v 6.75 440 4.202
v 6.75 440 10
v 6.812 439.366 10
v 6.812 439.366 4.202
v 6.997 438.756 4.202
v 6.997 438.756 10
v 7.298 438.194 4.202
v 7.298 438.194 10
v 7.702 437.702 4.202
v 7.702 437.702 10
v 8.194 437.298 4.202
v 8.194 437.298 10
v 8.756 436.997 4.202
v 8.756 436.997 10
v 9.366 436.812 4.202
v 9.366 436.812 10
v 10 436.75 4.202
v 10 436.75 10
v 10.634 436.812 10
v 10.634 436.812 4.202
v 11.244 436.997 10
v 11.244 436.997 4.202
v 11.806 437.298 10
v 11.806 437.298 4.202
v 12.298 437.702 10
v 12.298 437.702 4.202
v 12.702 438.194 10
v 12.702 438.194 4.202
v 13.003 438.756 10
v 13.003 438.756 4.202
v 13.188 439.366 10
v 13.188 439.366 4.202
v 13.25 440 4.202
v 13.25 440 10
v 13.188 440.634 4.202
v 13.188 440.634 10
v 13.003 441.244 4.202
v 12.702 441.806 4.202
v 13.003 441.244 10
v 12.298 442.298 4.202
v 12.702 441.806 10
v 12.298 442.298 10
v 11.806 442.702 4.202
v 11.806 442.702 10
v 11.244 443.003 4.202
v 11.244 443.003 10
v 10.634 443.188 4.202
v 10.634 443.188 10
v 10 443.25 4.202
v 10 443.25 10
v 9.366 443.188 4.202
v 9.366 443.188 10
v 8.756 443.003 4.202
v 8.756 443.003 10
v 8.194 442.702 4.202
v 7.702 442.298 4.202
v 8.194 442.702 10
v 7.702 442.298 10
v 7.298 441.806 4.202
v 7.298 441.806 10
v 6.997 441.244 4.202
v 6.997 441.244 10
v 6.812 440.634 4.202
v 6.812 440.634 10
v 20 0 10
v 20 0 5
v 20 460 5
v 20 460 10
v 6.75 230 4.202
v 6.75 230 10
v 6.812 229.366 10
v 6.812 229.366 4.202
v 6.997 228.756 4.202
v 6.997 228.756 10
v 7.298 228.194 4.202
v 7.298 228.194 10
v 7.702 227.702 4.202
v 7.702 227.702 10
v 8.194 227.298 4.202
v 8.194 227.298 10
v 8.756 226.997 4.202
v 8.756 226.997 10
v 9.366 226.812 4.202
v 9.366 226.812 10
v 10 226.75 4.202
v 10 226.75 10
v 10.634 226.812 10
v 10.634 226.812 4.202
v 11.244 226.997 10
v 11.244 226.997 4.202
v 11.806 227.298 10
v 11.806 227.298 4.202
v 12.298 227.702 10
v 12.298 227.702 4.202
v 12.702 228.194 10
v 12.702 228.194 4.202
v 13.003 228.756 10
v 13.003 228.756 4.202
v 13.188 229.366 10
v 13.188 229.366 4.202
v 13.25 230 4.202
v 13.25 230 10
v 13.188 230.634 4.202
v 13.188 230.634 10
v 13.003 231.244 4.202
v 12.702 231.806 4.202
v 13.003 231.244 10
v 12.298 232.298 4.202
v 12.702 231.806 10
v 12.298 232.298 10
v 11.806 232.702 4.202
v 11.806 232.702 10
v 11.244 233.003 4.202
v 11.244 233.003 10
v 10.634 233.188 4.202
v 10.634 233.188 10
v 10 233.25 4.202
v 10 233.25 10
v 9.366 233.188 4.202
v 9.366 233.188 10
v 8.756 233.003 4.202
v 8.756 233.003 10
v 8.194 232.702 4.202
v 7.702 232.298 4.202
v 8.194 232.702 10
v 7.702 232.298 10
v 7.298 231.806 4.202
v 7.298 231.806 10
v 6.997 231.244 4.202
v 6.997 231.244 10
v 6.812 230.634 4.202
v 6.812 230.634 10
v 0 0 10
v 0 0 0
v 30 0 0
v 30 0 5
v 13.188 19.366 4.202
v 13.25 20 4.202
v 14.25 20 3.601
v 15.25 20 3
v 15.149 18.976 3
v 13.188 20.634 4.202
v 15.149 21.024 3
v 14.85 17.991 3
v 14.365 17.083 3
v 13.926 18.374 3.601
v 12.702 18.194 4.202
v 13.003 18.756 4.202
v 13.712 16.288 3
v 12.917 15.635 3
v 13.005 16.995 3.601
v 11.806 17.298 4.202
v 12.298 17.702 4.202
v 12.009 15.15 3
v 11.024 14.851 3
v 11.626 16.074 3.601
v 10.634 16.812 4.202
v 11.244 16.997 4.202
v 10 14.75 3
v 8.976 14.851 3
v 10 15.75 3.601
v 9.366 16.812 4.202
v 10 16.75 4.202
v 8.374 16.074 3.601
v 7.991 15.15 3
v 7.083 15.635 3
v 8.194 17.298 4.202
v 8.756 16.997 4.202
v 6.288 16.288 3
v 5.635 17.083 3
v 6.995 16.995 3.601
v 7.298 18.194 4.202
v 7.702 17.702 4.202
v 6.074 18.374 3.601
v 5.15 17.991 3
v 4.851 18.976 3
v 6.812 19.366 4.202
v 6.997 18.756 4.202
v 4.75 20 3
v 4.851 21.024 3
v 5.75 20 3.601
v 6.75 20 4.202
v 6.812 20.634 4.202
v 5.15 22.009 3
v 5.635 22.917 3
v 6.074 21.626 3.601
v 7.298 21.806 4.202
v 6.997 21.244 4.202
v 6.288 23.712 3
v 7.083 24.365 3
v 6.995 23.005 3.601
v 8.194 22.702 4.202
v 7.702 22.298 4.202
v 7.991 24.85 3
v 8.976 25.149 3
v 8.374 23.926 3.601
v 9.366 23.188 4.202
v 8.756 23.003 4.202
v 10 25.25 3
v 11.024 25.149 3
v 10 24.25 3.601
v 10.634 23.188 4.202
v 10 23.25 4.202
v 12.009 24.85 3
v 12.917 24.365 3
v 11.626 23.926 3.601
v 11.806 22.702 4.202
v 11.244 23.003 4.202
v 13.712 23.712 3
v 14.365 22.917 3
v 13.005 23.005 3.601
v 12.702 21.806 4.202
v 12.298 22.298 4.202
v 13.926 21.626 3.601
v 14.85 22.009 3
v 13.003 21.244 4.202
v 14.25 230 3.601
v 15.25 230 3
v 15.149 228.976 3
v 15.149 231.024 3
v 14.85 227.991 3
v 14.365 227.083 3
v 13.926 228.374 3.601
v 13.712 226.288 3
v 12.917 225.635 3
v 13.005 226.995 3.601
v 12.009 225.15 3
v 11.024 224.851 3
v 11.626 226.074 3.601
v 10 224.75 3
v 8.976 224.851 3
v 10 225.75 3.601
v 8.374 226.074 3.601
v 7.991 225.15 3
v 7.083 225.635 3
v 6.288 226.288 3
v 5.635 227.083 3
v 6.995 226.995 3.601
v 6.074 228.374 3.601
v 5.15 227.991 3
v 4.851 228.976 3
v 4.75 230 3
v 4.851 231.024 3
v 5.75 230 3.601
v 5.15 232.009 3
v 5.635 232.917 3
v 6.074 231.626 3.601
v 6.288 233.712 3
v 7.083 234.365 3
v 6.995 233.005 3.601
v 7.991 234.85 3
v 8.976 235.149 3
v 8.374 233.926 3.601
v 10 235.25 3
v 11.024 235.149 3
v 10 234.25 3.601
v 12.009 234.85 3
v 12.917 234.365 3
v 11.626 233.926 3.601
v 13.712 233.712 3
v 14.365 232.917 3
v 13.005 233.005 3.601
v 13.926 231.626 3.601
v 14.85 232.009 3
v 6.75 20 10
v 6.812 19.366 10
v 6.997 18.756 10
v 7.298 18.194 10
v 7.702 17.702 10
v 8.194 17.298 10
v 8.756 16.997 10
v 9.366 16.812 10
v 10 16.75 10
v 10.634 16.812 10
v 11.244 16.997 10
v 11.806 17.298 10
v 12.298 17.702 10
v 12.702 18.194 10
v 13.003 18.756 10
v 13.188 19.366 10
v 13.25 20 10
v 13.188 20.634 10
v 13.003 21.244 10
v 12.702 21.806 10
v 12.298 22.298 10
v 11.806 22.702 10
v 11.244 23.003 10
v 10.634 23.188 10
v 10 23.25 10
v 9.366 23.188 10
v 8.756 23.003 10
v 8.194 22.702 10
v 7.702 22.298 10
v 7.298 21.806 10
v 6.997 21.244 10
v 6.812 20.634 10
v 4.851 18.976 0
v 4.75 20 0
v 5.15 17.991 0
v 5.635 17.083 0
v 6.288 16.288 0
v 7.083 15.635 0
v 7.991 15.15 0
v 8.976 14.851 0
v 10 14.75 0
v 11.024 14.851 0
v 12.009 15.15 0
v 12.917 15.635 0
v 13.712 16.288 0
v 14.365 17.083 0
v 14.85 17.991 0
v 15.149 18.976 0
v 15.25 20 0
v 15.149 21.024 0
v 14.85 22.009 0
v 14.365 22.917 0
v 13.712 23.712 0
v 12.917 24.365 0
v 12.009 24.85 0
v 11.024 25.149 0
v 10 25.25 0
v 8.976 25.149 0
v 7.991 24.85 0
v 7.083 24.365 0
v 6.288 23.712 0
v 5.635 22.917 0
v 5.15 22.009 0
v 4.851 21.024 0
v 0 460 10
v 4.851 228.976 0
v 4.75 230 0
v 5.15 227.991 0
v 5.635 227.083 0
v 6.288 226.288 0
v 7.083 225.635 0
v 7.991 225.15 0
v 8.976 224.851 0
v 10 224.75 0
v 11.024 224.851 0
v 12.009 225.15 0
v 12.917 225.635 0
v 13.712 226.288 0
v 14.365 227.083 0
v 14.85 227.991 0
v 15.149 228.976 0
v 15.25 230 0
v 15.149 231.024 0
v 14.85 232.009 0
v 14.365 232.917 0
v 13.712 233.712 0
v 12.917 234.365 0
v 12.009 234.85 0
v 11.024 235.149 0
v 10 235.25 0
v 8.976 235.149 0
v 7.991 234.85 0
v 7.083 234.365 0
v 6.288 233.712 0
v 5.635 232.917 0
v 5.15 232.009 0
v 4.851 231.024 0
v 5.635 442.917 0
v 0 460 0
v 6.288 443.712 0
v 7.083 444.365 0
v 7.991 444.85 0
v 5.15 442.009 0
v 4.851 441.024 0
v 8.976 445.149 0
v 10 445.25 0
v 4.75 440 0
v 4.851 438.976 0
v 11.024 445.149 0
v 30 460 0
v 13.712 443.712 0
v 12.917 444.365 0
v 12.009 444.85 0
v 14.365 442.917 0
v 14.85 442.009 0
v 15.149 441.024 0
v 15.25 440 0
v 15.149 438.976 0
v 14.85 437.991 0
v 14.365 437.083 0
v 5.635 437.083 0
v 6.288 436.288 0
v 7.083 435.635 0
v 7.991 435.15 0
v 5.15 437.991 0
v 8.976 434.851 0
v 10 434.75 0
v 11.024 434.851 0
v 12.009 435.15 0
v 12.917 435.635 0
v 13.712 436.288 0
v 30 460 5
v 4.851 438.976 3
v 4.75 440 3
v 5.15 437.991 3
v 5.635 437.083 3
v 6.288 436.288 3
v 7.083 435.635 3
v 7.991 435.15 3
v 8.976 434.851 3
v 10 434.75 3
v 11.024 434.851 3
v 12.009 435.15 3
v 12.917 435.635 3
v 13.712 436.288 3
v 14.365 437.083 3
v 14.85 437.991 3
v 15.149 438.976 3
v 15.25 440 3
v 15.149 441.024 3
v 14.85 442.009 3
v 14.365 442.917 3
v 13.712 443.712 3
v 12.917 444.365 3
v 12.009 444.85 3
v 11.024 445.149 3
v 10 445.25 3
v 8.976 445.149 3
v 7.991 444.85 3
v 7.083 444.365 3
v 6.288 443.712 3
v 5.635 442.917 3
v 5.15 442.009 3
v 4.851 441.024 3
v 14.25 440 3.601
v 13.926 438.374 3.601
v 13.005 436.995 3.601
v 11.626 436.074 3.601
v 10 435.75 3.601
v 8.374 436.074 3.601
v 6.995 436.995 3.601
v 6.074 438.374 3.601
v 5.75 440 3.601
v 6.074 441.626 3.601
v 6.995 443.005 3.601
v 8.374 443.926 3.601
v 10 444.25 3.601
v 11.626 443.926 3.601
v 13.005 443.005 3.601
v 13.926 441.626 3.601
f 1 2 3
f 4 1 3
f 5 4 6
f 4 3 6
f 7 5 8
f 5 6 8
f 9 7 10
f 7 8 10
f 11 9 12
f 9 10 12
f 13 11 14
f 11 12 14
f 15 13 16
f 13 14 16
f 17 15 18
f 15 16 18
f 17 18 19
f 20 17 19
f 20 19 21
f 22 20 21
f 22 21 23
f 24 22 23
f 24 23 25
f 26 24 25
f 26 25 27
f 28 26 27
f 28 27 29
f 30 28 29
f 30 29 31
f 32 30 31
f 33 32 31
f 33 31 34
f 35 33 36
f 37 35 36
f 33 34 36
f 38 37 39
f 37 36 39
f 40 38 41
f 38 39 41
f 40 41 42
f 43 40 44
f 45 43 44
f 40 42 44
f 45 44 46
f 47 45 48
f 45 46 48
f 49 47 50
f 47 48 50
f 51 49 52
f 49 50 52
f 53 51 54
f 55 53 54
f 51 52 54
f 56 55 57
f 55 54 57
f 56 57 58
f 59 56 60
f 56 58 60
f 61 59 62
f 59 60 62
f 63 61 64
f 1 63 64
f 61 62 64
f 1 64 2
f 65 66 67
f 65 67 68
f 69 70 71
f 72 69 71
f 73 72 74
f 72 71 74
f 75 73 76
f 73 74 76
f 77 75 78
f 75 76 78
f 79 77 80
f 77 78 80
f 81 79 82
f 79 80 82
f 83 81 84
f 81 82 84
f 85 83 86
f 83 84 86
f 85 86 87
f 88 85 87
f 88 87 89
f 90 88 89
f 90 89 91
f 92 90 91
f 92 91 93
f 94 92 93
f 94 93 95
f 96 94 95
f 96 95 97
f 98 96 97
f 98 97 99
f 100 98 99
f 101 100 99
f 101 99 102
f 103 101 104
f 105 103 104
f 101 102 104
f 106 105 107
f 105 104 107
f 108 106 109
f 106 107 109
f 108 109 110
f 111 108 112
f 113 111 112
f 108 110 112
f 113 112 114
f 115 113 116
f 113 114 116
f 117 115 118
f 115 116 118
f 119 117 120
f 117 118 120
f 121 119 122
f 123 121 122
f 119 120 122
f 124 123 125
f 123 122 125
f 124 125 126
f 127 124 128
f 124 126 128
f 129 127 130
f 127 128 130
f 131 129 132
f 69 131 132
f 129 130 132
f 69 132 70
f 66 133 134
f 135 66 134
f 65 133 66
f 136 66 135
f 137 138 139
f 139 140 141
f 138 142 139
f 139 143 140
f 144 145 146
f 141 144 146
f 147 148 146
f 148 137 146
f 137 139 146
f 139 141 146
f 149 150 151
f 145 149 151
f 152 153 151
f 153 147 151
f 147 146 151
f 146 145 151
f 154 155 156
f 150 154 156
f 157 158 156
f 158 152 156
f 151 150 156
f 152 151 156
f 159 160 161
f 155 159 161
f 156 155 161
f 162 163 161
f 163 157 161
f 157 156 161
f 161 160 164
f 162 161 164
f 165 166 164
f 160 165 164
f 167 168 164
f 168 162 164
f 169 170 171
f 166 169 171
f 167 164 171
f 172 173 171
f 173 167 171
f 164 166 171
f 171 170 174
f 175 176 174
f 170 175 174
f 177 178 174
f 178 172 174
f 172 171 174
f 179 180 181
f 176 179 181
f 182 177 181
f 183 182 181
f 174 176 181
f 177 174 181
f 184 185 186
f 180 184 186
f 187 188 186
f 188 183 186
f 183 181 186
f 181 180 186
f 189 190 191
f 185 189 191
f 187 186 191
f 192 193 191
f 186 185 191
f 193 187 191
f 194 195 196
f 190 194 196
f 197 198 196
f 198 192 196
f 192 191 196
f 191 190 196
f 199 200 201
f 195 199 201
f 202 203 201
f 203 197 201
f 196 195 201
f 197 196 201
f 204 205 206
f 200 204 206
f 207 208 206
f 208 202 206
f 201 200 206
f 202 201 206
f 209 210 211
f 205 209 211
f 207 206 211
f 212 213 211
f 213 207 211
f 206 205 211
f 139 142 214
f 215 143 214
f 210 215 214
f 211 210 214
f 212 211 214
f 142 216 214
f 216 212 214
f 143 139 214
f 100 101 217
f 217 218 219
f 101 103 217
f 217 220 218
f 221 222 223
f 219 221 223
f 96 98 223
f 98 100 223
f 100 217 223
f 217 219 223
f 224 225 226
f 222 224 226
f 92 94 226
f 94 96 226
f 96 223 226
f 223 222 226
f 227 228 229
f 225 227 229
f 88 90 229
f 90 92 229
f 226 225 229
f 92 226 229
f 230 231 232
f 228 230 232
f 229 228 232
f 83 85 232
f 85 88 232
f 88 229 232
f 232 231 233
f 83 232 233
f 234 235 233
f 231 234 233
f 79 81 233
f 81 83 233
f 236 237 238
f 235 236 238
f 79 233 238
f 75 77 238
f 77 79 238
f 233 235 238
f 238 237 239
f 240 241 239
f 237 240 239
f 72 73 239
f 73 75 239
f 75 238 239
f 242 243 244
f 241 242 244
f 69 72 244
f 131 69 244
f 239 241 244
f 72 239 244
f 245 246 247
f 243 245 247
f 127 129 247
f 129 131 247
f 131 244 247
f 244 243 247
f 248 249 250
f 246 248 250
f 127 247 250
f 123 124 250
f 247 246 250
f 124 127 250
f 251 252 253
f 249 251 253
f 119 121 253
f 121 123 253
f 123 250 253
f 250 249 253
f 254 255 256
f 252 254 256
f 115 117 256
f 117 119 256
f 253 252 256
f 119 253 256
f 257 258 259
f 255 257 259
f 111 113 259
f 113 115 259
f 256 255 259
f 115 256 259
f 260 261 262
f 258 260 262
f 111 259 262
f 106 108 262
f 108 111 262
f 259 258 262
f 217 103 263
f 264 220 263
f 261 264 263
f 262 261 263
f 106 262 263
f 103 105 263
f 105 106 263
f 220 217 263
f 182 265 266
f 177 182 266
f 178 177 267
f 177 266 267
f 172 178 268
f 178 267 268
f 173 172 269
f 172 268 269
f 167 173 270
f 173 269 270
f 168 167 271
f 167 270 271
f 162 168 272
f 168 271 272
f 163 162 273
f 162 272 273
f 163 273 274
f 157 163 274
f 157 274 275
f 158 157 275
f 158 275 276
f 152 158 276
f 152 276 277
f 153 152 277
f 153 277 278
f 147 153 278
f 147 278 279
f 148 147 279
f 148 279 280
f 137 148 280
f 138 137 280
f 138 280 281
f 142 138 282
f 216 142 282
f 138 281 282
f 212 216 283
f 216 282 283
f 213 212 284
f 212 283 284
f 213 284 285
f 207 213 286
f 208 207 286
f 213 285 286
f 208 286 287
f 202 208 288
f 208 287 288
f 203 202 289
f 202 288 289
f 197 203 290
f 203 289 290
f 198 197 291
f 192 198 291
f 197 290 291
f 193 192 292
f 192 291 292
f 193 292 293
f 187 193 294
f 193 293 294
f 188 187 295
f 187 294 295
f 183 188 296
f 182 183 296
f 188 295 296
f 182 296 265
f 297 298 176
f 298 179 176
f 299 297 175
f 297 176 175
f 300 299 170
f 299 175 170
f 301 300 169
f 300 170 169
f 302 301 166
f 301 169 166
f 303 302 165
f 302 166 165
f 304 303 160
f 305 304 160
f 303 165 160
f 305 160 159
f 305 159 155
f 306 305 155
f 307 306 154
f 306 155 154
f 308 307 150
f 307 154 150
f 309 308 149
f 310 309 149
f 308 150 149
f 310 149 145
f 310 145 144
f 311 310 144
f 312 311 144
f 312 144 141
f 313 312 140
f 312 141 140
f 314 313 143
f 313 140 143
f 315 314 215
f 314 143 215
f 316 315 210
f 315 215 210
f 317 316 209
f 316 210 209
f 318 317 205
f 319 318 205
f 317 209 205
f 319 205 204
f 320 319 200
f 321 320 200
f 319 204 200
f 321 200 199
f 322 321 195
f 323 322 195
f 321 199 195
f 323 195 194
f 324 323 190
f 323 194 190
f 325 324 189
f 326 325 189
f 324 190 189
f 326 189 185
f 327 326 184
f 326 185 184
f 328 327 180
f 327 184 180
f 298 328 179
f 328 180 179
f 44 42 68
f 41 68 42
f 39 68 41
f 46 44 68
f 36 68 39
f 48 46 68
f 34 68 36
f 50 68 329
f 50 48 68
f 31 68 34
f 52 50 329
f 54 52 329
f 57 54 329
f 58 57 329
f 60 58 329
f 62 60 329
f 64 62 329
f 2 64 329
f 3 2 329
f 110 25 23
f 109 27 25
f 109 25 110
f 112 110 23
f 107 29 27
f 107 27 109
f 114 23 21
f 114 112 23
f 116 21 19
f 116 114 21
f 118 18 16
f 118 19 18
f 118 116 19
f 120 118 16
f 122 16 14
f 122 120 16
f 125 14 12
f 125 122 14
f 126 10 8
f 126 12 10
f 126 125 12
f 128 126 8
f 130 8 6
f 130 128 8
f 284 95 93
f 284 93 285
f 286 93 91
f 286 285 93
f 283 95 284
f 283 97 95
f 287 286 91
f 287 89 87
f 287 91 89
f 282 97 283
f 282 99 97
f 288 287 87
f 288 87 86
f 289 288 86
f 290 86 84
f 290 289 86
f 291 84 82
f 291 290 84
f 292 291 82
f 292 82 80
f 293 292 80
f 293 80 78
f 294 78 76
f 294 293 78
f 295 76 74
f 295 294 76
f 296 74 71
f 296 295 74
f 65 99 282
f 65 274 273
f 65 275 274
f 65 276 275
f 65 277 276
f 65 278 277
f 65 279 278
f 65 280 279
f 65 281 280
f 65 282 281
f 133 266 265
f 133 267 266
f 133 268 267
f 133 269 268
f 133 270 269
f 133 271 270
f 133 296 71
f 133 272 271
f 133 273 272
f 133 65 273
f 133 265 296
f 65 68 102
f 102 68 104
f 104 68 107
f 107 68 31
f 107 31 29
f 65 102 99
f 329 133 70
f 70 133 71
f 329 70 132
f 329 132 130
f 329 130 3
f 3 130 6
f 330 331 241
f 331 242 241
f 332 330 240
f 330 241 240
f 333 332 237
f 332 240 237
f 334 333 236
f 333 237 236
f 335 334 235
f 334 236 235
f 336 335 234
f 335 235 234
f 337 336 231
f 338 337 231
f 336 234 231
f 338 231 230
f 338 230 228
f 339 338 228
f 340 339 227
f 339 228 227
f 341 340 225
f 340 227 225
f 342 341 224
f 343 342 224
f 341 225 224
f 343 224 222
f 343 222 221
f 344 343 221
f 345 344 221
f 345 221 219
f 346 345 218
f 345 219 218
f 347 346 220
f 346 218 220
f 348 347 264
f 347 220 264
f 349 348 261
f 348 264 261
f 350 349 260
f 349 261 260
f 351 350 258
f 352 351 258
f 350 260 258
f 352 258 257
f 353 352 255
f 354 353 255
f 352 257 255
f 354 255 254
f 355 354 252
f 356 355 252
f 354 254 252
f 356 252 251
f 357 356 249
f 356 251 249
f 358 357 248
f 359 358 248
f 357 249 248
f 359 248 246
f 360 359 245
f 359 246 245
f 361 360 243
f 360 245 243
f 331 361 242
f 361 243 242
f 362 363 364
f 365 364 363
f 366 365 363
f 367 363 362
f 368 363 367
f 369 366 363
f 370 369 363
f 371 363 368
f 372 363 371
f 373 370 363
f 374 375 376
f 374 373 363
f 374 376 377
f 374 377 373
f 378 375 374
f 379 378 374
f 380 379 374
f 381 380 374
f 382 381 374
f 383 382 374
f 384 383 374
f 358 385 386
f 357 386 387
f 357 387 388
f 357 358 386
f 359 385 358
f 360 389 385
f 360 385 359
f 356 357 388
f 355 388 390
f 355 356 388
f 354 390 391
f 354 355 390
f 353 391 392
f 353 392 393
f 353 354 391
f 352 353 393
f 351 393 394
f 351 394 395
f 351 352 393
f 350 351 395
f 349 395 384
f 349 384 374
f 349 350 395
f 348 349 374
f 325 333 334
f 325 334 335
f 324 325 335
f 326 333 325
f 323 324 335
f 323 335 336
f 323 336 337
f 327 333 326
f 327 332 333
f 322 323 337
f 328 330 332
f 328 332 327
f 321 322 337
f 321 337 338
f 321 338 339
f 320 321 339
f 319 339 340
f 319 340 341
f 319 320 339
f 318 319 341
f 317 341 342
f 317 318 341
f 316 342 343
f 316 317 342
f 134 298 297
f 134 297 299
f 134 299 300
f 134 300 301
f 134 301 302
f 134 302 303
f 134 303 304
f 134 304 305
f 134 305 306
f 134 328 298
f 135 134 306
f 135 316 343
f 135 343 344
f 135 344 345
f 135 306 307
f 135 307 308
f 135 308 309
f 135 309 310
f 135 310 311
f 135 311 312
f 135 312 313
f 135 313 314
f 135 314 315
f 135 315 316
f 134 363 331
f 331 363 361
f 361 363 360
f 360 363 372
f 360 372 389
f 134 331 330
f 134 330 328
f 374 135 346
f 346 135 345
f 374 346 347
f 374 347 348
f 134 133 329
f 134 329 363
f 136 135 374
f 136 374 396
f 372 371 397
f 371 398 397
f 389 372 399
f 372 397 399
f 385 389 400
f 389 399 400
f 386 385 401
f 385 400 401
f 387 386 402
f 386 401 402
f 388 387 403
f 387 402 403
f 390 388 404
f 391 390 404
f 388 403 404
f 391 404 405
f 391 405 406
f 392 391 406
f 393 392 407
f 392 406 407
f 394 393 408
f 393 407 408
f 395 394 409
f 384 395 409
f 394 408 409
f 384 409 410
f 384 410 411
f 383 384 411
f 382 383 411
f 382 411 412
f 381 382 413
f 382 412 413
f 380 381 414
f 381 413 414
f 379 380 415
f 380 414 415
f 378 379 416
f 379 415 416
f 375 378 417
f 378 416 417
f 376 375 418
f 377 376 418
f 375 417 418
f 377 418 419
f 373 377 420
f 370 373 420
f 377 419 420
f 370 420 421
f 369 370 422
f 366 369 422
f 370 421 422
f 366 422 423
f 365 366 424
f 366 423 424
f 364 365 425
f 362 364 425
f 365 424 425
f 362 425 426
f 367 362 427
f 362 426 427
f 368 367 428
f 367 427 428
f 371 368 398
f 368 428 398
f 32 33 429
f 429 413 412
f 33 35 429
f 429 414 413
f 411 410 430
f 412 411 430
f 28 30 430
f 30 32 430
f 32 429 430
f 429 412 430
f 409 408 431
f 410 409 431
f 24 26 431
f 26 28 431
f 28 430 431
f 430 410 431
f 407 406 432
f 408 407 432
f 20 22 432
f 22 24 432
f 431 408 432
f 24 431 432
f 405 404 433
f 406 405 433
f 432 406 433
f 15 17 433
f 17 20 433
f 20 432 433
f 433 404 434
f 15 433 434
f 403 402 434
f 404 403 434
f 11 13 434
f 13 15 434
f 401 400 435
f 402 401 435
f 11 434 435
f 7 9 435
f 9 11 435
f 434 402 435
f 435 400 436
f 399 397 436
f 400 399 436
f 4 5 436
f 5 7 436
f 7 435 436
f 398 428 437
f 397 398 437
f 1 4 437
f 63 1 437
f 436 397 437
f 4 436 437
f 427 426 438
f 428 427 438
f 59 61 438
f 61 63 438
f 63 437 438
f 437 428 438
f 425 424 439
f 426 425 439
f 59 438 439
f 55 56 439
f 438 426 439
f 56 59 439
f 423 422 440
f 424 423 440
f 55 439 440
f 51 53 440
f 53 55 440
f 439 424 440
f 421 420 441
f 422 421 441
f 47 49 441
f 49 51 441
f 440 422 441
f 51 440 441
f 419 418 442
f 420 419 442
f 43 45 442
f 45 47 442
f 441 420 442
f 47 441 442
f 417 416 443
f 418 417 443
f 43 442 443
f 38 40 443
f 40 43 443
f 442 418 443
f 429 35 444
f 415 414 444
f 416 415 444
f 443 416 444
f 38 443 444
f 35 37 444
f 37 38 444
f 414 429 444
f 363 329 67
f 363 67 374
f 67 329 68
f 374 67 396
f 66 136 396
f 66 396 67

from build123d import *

# Parameters (mm, degrees)
F1_DEPTH  = 460
F3_D      = 6.5
F5_D      = 6.5
F7_D      = 6.5
F9_D      = 10.5
F9_DEPTH  = 3
F9_TIP    = 3.1545182499
F11_D     = 10.5
F11_DEPTH = 3
F11_TIP   = 3.1545182499
F13_D     = 10.5
F13_DEPTH = 3
F13_TIP   = 3.1545182499


with BuildPart() as f1:
    # F0 (on Front) → F1 (new body)
    with BuildSketch(Plane.XZ):
        Polygon((0, 10), (0, 0), (30, 0), (30, 5), (20, 5), (20, 10), align=None)
    extrude(amount=-F1_DEPTH)

    # F3 (through all)
    with Locations(Plane(origin=(0, 0, 0), x_dir=(1, 0, 0), z_dir=(0, 0, -1))):
        with Locations((10, -440)):
            Hole(F3_D / 2)

    # F5 (through all)
    with Locations(Plane(origin=(0, 0, 0), x_dir=(1, 0, 0), z_dir=(0, 0, -1))):
        with Locations((10, -230)):
            Hole(F5_D / 2)

    # F7 (through all)
    with Locations(Plane(origin=(0, 0, 0), x_dir=(1, 0, 0), z_dir=(0, 0, -1))):
        with Locations((10, -20)):
            Hole(F7_D / 2)

    # F9
    with Locations(Plane(origin=(0, 0, 0), x_dir=(1, 0, 0), z_dir=(0, 0, -1))):
        with Locations((10, -440)):
            Hole(F9_D / 2, depth=F9_DEPTH)
            with Locations((0, 0, -(F9_DEPTH + F9_TIP / 2))):  # 118° drill point
                Cone(0, F9_D / 2, F9_TIP, mode=Mode.SUBTRACT)

    # F11
    with Locations(Plane(origin=(0, 0, 0), x_dir=(1, 0, 0), z_dir=(0, 0, -1))):
        with Locations((10, -230)):
            Hole(F11_D / 2, depth=F11_DEPTH)
            with Locations((0, 0, -(F11_DEPTH + F11_TIP / 2))):  # 118° drill point
                Cone(0, F11_D / 2, F11_TIP, mode=Mode.SUBTRACT)

    # F13
    with Locations(Plane(origin=(0, 0, 0), x_dir=(1, 0, 0), z_dir=(0, 0, -1))):
        with Locations((10, -20)):
            Hole(F13_D / 2, depth=F13_DEPTH)
            with Locations((0, 0, -(F13_DEPTH + F13_TIP / 2))):  # 118° drill point
                Cone(0, F13_D / 2, F13_TIP, mode=Mode.SUBTRACT)


solid = f1.part
